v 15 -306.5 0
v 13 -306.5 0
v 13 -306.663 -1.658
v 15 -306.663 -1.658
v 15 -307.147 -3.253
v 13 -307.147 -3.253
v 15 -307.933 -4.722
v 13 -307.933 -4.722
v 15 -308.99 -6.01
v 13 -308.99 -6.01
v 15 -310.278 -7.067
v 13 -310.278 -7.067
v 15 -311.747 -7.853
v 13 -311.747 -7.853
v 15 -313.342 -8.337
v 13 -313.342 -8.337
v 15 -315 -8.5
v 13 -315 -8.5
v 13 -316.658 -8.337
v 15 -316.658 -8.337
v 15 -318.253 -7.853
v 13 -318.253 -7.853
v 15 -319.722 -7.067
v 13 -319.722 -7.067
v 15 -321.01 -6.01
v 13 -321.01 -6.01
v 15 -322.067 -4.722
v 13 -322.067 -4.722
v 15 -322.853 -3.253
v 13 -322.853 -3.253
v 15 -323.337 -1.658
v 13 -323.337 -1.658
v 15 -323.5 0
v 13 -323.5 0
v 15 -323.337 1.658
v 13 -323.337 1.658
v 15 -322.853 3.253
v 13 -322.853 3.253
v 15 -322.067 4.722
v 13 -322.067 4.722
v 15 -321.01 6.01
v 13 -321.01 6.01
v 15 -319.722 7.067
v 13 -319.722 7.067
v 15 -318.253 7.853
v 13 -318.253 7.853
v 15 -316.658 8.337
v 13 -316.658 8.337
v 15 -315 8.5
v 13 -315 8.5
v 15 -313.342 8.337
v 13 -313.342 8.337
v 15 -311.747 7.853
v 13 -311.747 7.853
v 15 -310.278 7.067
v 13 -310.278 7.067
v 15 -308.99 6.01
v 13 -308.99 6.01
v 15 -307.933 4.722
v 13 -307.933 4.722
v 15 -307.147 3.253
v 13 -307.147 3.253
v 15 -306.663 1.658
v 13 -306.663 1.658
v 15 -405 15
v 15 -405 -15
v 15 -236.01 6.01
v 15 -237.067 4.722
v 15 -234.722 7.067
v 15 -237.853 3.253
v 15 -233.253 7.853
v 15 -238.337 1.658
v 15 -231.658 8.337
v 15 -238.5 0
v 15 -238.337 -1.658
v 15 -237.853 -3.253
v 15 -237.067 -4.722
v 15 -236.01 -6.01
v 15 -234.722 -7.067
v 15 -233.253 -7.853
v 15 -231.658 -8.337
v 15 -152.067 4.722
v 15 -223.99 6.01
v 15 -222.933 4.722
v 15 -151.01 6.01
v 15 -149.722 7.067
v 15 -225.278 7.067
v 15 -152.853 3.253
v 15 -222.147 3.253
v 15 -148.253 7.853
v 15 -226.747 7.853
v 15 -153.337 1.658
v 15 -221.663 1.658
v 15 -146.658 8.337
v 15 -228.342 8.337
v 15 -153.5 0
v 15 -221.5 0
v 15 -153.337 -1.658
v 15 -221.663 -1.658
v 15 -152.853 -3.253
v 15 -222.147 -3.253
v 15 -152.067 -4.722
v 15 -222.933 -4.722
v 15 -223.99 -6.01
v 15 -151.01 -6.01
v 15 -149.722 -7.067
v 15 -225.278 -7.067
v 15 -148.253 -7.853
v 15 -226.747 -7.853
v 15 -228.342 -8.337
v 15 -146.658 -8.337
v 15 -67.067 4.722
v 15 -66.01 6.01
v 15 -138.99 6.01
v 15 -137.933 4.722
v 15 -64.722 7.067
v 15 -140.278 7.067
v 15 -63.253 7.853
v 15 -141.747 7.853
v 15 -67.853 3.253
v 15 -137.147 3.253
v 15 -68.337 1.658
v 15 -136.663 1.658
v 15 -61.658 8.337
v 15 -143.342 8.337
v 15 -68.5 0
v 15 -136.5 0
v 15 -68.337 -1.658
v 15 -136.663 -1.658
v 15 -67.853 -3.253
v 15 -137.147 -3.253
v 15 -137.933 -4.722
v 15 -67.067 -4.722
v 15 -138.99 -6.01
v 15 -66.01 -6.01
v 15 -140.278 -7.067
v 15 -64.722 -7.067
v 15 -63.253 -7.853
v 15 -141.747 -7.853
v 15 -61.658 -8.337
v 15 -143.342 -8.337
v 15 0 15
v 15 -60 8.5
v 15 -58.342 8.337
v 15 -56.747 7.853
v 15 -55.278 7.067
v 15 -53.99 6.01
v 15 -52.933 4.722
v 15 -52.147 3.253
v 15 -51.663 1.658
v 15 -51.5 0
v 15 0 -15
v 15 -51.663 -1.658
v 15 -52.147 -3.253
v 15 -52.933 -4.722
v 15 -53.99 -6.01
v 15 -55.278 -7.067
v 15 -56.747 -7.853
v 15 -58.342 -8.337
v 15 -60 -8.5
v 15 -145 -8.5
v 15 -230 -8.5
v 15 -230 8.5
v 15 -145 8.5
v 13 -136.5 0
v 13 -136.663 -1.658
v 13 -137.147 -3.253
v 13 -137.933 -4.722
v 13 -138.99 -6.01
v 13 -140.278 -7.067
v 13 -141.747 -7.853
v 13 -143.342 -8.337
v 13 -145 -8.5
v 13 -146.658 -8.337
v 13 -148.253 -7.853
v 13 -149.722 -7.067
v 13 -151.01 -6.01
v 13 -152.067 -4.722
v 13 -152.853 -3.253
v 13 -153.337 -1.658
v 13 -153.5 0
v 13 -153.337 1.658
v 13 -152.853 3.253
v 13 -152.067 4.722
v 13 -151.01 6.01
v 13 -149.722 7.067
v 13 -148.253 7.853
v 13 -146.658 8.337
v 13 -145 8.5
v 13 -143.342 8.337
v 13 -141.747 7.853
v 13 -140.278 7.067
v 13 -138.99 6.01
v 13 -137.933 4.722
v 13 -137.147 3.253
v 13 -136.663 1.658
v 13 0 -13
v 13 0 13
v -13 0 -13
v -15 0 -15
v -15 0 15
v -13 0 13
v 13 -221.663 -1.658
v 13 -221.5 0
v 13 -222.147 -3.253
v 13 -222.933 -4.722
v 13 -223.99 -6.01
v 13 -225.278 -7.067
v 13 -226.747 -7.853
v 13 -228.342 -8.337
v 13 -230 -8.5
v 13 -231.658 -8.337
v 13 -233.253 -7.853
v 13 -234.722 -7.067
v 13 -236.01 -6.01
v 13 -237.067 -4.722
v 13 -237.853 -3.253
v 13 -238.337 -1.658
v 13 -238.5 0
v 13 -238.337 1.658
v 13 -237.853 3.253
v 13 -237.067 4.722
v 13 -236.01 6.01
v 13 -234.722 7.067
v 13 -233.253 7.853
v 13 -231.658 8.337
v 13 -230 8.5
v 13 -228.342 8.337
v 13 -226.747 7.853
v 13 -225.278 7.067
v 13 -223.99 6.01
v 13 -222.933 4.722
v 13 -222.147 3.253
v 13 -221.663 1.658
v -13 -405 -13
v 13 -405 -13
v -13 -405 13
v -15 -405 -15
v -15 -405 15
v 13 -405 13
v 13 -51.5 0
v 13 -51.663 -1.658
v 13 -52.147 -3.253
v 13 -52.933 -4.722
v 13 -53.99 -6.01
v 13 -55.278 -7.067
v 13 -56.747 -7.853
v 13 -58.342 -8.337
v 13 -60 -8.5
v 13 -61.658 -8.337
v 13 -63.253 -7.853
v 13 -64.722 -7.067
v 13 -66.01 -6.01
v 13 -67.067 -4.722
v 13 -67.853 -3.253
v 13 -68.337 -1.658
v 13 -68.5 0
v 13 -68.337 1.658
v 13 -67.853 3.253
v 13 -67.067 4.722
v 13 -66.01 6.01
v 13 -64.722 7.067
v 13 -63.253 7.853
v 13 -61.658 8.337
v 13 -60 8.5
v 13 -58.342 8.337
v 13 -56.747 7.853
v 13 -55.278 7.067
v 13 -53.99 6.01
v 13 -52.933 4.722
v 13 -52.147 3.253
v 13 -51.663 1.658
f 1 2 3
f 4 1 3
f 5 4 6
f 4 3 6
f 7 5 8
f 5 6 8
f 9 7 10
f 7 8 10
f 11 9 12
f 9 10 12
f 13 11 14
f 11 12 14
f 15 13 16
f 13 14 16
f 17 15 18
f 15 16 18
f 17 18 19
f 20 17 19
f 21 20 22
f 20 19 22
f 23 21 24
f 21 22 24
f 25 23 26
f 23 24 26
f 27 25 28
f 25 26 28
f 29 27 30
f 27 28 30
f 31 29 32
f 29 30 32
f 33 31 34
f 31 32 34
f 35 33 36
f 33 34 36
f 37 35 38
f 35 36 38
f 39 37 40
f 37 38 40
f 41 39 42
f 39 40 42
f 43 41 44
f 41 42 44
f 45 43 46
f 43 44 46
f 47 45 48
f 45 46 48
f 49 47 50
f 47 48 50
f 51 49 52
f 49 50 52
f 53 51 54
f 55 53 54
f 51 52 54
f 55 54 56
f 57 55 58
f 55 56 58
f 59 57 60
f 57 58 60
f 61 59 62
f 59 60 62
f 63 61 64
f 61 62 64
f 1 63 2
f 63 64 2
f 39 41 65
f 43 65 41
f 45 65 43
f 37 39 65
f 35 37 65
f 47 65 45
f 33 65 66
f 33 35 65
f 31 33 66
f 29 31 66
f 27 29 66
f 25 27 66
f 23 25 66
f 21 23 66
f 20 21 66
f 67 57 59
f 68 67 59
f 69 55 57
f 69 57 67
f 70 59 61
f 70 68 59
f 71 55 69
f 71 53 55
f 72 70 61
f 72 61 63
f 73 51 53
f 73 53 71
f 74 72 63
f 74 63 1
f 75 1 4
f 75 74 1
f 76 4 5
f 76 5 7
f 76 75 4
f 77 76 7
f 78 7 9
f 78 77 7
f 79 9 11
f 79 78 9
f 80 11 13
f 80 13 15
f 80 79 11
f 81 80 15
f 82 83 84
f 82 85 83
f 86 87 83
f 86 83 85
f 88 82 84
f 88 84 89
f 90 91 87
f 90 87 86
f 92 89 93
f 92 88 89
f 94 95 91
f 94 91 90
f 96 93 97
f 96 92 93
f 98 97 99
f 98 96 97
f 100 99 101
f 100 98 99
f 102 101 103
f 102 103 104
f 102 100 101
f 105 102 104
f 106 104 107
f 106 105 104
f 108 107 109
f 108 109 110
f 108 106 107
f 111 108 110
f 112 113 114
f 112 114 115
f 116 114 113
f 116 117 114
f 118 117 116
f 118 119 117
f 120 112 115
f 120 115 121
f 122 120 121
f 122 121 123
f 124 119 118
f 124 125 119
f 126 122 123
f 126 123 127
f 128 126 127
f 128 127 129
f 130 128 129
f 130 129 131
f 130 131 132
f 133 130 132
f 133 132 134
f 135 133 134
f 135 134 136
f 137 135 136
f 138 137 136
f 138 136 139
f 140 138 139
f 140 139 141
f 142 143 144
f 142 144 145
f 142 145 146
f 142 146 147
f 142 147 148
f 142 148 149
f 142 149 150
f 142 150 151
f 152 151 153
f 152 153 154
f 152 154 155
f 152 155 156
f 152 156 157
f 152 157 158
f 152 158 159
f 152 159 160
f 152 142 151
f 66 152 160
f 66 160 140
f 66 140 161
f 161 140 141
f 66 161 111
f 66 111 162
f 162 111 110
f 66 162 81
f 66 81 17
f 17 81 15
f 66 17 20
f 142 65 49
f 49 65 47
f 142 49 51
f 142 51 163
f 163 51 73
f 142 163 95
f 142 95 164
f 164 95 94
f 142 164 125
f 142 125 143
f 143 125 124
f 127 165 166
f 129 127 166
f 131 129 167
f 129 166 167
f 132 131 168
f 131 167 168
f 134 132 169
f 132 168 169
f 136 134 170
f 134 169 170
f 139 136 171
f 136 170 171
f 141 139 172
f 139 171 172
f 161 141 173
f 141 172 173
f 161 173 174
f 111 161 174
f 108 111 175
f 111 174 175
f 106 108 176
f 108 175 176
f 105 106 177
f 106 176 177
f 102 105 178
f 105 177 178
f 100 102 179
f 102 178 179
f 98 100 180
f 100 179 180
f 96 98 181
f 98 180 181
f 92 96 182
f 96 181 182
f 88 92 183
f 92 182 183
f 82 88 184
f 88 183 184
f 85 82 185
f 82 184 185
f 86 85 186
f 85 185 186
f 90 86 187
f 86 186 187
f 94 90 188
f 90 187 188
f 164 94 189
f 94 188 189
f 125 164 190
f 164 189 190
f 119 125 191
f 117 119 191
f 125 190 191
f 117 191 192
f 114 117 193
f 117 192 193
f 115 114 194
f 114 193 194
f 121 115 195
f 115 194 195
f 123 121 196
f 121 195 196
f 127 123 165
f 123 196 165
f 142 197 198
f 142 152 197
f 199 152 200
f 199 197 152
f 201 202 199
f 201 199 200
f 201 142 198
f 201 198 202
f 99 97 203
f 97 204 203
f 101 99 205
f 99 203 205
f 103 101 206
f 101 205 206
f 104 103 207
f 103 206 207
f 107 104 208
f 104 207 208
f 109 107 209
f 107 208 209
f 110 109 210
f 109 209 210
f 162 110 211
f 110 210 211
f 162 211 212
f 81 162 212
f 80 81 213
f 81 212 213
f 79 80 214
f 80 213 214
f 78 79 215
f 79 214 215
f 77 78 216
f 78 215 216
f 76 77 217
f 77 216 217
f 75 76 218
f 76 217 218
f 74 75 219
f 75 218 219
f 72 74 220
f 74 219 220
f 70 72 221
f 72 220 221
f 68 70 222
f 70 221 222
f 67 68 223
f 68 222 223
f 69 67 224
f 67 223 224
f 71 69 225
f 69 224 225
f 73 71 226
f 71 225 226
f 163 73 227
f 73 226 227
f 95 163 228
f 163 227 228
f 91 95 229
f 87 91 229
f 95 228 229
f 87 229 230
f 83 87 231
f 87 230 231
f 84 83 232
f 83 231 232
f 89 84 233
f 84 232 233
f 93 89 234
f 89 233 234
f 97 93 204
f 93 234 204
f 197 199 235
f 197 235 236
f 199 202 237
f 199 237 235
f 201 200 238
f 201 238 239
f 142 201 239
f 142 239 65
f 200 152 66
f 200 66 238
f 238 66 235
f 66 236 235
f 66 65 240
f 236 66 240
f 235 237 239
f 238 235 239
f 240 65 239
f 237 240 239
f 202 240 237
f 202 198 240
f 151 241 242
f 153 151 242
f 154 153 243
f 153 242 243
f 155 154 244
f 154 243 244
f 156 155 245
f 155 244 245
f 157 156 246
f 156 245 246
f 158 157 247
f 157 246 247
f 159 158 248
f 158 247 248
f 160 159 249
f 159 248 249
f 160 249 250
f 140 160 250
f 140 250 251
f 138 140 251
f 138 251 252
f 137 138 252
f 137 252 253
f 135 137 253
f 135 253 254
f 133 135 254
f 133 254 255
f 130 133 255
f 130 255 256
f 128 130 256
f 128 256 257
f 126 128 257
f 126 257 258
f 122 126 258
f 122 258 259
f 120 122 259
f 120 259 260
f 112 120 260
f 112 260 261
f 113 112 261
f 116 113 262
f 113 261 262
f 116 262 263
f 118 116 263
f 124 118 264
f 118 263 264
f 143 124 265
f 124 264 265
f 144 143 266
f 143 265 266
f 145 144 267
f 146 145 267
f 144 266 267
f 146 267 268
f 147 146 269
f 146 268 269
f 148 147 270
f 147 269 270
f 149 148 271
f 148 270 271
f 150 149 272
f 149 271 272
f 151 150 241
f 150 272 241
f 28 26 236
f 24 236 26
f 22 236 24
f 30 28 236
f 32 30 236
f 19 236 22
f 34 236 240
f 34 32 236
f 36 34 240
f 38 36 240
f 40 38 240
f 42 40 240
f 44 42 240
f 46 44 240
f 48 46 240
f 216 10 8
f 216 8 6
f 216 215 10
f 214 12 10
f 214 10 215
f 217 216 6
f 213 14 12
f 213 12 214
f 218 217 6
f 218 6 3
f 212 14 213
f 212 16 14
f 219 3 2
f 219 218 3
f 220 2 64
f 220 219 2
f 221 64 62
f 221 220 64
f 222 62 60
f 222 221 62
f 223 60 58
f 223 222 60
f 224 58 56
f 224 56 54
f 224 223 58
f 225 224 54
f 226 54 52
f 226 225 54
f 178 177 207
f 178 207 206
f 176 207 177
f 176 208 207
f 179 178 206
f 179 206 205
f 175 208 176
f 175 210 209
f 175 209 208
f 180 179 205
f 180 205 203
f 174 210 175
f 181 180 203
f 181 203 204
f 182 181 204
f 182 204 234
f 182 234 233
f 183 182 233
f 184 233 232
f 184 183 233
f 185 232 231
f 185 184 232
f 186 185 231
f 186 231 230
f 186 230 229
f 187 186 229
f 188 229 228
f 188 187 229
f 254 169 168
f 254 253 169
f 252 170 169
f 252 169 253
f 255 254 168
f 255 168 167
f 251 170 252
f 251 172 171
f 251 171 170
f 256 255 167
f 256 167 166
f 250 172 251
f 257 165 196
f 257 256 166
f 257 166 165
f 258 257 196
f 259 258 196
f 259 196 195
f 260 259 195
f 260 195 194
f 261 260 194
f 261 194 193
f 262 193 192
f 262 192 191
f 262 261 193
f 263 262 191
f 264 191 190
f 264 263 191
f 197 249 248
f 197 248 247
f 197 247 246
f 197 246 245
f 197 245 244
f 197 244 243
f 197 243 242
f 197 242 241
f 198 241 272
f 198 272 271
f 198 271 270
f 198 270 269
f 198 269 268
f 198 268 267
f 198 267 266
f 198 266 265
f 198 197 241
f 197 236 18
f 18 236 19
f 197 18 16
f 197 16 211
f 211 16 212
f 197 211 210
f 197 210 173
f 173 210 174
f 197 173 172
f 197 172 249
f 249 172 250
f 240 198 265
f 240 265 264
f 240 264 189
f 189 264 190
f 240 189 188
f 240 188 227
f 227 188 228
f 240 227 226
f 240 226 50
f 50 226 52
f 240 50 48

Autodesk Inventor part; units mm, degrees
ref_plane "YZ Plane" through (0, 0, 0) normal (1, 0, 0) x (0, 1, 0)
ref_plane "XZ Plane" through (0, 0, 0) normal (0, 1, 0) x (-1, 0, 0)
ref_plane "XY Plane" through (0, 0, 0) normal (0, 0, 1) x (1, 0, 0)
sketch "Sketch9" plane through (0, 0, 0) normal (0, 1, 0) x (-1, 0, 0)
  line L0 (15, 15) -> (-15, 15)
  line L1 (-15, 15) -> (-15, -15)
  line L2 (-15, -15) -> (15, -15)
  line L3 (15, -15) -> (15, 15)
  line L4 (15, 15) -> (-15, -15) construction
  line L5 (-15, 15) -> (15, -15) construction
  line L6 (-13, 13) -> (13, 13)
  line L7 (13, 13) -> (13, -13)
  line L8 (13, -13) -> (-13, -13)
  line L9 (-13, -13) -> (-13, 13)
  point P0 (0, 0)
  dimension "d172" = 30
  dimension "d173" = 30
  dimension "d174" = 2
extrude "Extrusion3" add sketch "Sketch9" against normal blind 405
sketch "Sketch10" plane through (0, 0, 0) normal (1, 0, 0) x (0, 1, 0)
  line L0 (0, 15) -> (0, -15) construction
  line L1 (0, 15) -> (-405, 15) construction
  line L2 (-405, -15) -> (-405, 15) construction
  line L3 (0, -15) -> (-405, -15) construction
  line L4 (-68.5, 8.5) -> (-51.5, 8.5)
  line L5 (-51.5, 8.5) -> (-51.5, -8.5)
  line L6 (-51.5, -8.5) -> (-68.5, -8.5)
  line L7 (-68.5, -8.5) -> (-68.5, 8.5)
  line L8 (-68.5, 8.5) -> (-51.5, -8.5) construction
  line L9 (-51.5, 8.5) -> (-68.5, -8.5) construction
  line L10 (0, 0) -> (30, 0)
  circle A0 centre (-60, 0) radius 8.5
  dimension "d177" = 17
  dimension "d178" = 17
  dimension "d181" = 30
  dimension "d182" = 90
extrude "Extrusion4" cut sketch "Sketch10" along normal through all contours A0
pattern_linear "Rectangular Pattern4" count 4 spacing 85 along (0, -1, 0) of "Extrusion4"
properties part number "PRS 8661 FDS 1000 way tube 1_940" material "Stainless Steel"
